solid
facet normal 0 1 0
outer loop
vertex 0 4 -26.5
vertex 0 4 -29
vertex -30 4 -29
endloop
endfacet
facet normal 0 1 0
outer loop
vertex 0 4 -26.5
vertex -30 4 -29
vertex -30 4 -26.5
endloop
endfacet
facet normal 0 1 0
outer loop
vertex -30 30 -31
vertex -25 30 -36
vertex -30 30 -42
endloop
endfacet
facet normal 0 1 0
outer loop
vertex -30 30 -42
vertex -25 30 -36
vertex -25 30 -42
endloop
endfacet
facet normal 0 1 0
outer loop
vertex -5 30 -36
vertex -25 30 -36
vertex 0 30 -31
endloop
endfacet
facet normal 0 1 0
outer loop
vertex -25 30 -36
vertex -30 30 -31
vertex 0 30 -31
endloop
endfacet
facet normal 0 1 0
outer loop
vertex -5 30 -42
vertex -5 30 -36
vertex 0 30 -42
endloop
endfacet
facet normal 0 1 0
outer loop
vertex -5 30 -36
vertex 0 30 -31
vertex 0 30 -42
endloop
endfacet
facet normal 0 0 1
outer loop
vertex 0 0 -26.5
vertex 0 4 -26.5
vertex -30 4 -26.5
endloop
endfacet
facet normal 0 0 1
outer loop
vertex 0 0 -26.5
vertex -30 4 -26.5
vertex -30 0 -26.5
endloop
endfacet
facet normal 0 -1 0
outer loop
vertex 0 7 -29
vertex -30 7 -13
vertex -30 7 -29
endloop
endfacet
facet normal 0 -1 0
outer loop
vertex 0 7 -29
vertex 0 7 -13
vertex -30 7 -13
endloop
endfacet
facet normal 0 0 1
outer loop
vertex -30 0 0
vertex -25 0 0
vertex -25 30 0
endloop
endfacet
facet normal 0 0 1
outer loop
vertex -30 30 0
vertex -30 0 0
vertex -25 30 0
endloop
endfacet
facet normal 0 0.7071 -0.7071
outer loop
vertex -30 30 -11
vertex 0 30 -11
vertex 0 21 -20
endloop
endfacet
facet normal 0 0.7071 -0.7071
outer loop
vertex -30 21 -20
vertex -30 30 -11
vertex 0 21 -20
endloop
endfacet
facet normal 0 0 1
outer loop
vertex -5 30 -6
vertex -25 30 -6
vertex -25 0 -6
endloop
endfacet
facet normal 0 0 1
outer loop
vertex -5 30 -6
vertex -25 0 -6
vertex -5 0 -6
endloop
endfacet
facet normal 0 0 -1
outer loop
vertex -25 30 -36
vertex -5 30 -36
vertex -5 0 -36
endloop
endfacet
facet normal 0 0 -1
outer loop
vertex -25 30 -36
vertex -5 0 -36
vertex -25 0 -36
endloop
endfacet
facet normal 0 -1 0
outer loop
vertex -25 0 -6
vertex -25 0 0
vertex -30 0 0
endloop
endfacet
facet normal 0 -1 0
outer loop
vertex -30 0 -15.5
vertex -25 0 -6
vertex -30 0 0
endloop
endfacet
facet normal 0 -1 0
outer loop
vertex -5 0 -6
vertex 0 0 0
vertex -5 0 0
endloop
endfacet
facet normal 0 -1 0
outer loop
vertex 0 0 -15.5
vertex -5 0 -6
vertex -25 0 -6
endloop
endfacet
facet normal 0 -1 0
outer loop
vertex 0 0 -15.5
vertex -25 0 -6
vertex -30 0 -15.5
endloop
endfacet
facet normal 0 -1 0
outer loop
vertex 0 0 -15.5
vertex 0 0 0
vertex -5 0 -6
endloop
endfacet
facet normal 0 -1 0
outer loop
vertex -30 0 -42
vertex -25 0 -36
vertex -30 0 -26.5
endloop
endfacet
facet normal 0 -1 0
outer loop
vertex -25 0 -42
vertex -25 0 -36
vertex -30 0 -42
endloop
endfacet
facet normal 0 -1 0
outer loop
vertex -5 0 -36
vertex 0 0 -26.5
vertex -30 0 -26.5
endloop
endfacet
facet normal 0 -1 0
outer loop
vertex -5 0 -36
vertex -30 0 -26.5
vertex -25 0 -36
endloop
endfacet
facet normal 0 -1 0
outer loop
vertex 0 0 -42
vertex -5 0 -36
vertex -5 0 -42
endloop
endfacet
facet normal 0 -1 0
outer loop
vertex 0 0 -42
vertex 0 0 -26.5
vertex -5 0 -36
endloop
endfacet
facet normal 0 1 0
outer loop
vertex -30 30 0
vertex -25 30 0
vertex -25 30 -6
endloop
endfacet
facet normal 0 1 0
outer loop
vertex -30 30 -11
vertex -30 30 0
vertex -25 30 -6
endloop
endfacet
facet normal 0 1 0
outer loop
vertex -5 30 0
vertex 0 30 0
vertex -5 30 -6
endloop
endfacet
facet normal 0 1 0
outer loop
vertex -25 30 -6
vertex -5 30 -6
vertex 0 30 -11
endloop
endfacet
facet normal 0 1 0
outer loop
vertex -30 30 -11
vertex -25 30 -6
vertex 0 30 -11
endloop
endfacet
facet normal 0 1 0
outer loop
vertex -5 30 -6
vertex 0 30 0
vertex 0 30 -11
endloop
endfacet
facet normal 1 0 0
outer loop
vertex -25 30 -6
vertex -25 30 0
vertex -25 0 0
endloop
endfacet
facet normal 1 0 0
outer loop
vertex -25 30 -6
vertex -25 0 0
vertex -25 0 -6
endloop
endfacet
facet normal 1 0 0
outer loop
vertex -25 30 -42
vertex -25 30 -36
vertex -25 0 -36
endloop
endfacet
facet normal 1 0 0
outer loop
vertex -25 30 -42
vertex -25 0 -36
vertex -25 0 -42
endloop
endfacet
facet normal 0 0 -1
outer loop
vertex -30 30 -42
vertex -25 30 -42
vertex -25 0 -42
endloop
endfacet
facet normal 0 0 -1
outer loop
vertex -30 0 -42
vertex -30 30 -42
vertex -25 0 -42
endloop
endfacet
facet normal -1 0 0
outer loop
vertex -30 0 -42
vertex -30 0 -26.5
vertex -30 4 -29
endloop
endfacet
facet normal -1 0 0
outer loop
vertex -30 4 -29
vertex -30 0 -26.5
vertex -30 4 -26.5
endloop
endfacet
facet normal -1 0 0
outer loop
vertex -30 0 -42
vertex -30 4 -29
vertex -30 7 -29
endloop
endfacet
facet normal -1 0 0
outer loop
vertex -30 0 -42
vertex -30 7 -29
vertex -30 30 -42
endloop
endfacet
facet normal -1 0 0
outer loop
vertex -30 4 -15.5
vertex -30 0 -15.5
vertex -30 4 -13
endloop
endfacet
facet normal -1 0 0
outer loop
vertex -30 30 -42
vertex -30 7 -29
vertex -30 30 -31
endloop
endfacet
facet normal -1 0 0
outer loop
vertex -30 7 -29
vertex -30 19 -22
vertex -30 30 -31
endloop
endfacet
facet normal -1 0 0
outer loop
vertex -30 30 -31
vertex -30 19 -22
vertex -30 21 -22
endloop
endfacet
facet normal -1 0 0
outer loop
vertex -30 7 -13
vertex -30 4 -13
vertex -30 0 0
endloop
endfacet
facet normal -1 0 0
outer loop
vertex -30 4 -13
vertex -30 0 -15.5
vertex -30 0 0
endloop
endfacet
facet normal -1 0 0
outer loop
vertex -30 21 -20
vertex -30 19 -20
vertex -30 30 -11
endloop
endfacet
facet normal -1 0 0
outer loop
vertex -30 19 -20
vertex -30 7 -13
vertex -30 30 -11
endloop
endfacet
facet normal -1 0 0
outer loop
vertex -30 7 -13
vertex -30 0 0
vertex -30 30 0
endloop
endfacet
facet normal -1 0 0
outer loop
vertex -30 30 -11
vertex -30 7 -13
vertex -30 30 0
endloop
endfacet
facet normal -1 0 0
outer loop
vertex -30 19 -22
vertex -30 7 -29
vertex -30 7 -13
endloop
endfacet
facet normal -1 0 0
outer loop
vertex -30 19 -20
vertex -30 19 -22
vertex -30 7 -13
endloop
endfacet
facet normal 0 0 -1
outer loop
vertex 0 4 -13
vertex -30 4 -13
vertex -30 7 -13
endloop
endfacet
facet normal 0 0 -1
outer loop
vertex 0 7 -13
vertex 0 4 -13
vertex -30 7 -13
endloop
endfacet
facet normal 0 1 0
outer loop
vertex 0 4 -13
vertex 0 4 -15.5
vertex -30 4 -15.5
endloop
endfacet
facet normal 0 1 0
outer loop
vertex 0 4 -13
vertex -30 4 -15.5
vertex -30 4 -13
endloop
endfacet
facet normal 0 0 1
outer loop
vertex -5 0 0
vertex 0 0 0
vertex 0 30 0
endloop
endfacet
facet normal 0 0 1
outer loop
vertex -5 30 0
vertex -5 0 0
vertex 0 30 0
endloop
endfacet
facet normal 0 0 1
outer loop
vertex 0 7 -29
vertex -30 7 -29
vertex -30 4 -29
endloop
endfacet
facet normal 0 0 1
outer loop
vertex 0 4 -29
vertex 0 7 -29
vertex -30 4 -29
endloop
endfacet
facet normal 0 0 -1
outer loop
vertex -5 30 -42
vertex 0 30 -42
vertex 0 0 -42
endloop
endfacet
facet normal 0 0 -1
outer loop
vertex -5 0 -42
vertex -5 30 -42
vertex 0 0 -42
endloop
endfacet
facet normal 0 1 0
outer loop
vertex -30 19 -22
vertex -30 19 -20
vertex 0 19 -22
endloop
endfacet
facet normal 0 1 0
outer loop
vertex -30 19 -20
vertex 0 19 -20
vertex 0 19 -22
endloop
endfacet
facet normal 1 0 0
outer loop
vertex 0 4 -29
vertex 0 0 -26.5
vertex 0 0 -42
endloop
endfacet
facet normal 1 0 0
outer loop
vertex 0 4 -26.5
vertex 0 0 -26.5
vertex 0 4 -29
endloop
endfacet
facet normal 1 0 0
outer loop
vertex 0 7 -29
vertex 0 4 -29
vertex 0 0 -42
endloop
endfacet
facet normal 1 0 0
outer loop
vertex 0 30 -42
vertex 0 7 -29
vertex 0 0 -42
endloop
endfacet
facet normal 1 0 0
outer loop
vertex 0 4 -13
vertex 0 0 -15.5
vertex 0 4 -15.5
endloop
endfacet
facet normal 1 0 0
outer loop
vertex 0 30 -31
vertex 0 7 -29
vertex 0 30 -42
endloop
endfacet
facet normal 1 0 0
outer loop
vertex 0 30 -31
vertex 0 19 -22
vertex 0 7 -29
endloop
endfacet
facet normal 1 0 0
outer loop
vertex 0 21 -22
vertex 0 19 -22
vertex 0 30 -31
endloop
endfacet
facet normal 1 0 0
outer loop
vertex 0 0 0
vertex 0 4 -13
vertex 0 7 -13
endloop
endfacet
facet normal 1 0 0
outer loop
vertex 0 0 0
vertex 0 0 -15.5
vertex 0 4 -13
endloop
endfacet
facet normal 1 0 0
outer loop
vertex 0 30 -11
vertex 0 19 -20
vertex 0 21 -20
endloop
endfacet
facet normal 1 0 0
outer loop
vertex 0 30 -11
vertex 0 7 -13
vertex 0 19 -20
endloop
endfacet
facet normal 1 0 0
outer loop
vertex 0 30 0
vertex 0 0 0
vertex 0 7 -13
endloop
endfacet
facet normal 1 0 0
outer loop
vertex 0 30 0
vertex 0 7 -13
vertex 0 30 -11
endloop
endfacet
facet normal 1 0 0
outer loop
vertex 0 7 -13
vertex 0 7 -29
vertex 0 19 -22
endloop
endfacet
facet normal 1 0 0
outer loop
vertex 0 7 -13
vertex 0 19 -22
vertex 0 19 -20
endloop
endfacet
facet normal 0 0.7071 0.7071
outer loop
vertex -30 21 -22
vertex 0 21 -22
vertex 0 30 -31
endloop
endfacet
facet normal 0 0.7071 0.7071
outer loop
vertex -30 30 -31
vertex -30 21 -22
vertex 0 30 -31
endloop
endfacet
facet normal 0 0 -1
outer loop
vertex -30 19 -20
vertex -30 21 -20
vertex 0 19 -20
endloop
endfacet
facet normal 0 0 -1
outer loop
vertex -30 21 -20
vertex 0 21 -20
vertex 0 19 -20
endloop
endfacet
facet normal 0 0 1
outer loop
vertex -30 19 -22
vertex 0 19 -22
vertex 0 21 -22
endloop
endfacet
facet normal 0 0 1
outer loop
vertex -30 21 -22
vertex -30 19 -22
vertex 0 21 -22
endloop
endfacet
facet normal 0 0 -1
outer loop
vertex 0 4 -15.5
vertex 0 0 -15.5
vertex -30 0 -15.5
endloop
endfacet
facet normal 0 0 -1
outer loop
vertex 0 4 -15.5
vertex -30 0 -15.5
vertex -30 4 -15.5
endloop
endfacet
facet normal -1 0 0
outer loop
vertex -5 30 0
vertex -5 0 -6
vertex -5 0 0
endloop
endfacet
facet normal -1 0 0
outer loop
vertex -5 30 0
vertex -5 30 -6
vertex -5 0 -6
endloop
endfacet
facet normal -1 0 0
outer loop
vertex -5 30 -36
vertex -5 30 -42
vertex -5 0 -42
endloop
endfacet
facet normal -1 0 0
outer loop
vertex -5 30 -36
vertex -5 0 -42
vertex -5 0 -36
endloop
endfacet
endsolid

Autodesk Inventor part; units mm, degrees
ref_plane "YZ Plane" through (0, 0, 0) normal (1, 0, 0) x (0, 1, 0)
ref_plane "XZ Plane" through (0, 0, 0) normal (0, 1, 0) x (-1, 0, 0)
ref_plane "XY Plane" through (0, 0, 0) normal (0, 0, 1) x (1, 0, 0)
sketch "Sketch1" plane through (0, 0, 0) normal (1, 0, 0) x (0, 1, 0)
  line L0 (0, 0) -> (30, 0)
  line L1 (30, 0) -> (30, -11)
  line L2 (30, -11) -> (21, -20)
  line L3 (21, -20) -> (19, -20)
  line L4 (19, -20) -> (19, -22)
  line L5 (19, -22) -> (21, -22)
  line L6 (21, -22) -> (30, -31)
  line L7 (30, -31) -> (30, -42)
  line L8 (30, -42) -> (0, -42)
  line L9 (0, 0) -> (0, -42)
  dimension "d5" = 42
  dimension "d6" = 30
  dimension "d7" = 2
  dimension "d8" = 11
  dimension "d9" = 2
  dimension "d10" = 2
  dimension "d17" = 20
  dimension "d18" = 11
extrude "Extrusion1" add sketch "Sketch1" against normal blind 30
sketch "Sketch2" plane through (0, 30, 0) normal (0, 1, 0) x (1, 0, 0)
  line L0 (0, 0) -> (-30, 0) projected
  line L1 (-25, 0) -> (-25, 6)
  line L2 (-25, 6) -> (-5, 6)
  line L3 (-5, 6) -> (-5, 0)
  line L4 (-30, 0) -> (-30, 11) projected
  line L5 (0, 11) -> (0, 0) projected
  line L6 (-25, 0) -> (-5, 0)
  line L7 (0, 42) -> (-30, 42) projected
  line L8 (-5, 42) -> (-5, 36)
  line L9 (-5, 36) -> (-25, 36)
  line L10 (-25, 36) -> (-25, 42)
  line L11 (-30, 31) -> (-30, 42) projected
  line L12 (0, 42) -> (0, 31) projected
  dimension "d13" = 5
  dimension "d14" = 5
  dimension "d21" = 30
  dimension "d22" = 6
  dimension "d23" = 5
  dimension "d24" = 5
extrude "Extrusion2" cut sketch "Sketch2" against normal blind 30 contours L0 L1 L2 L3
extrude "Extrusion3" cut sketch "Sketch2" against normal blind 30 contours L8 L9 L10 L7
sketch "Sketch4" plane through (0, 0, 0) normal (1, 0, 0) x (0, 0, -1)
  line L0 (42, 0) -> (0, 0) projected
  line L1 (15.5, 0) -> (15.5, 4)
  line L2 (15.5, 4) -> (13, 4)
  line L3 (13, 4) -> (13, 7)
  line L4 (13, 7) -> (29, 7)
  line L5 (29, 7) -> (29, 4)
  line L6 (29, 4) -> (26.5, 4)
  line L7 (26.5, 4) -> (26.5, 0)
  line L8 (0, 30) -> (0, 0) projected
  line L9 (42, 0) -> (42, 30) projected
  line L10 (15.5, 0) -> (26.5, 0)
  dimension "d27" = 15.5
  dimension "d28" = 15.5
  dimension "d29" = 2.5
  dimension "d30" = 2.5
  dimension "d31" = 3
  dimension "d32" = 4
extrude "Extrusion4" cut sketch "Sketch4" against normal blind 30
properties part number "peca2"
